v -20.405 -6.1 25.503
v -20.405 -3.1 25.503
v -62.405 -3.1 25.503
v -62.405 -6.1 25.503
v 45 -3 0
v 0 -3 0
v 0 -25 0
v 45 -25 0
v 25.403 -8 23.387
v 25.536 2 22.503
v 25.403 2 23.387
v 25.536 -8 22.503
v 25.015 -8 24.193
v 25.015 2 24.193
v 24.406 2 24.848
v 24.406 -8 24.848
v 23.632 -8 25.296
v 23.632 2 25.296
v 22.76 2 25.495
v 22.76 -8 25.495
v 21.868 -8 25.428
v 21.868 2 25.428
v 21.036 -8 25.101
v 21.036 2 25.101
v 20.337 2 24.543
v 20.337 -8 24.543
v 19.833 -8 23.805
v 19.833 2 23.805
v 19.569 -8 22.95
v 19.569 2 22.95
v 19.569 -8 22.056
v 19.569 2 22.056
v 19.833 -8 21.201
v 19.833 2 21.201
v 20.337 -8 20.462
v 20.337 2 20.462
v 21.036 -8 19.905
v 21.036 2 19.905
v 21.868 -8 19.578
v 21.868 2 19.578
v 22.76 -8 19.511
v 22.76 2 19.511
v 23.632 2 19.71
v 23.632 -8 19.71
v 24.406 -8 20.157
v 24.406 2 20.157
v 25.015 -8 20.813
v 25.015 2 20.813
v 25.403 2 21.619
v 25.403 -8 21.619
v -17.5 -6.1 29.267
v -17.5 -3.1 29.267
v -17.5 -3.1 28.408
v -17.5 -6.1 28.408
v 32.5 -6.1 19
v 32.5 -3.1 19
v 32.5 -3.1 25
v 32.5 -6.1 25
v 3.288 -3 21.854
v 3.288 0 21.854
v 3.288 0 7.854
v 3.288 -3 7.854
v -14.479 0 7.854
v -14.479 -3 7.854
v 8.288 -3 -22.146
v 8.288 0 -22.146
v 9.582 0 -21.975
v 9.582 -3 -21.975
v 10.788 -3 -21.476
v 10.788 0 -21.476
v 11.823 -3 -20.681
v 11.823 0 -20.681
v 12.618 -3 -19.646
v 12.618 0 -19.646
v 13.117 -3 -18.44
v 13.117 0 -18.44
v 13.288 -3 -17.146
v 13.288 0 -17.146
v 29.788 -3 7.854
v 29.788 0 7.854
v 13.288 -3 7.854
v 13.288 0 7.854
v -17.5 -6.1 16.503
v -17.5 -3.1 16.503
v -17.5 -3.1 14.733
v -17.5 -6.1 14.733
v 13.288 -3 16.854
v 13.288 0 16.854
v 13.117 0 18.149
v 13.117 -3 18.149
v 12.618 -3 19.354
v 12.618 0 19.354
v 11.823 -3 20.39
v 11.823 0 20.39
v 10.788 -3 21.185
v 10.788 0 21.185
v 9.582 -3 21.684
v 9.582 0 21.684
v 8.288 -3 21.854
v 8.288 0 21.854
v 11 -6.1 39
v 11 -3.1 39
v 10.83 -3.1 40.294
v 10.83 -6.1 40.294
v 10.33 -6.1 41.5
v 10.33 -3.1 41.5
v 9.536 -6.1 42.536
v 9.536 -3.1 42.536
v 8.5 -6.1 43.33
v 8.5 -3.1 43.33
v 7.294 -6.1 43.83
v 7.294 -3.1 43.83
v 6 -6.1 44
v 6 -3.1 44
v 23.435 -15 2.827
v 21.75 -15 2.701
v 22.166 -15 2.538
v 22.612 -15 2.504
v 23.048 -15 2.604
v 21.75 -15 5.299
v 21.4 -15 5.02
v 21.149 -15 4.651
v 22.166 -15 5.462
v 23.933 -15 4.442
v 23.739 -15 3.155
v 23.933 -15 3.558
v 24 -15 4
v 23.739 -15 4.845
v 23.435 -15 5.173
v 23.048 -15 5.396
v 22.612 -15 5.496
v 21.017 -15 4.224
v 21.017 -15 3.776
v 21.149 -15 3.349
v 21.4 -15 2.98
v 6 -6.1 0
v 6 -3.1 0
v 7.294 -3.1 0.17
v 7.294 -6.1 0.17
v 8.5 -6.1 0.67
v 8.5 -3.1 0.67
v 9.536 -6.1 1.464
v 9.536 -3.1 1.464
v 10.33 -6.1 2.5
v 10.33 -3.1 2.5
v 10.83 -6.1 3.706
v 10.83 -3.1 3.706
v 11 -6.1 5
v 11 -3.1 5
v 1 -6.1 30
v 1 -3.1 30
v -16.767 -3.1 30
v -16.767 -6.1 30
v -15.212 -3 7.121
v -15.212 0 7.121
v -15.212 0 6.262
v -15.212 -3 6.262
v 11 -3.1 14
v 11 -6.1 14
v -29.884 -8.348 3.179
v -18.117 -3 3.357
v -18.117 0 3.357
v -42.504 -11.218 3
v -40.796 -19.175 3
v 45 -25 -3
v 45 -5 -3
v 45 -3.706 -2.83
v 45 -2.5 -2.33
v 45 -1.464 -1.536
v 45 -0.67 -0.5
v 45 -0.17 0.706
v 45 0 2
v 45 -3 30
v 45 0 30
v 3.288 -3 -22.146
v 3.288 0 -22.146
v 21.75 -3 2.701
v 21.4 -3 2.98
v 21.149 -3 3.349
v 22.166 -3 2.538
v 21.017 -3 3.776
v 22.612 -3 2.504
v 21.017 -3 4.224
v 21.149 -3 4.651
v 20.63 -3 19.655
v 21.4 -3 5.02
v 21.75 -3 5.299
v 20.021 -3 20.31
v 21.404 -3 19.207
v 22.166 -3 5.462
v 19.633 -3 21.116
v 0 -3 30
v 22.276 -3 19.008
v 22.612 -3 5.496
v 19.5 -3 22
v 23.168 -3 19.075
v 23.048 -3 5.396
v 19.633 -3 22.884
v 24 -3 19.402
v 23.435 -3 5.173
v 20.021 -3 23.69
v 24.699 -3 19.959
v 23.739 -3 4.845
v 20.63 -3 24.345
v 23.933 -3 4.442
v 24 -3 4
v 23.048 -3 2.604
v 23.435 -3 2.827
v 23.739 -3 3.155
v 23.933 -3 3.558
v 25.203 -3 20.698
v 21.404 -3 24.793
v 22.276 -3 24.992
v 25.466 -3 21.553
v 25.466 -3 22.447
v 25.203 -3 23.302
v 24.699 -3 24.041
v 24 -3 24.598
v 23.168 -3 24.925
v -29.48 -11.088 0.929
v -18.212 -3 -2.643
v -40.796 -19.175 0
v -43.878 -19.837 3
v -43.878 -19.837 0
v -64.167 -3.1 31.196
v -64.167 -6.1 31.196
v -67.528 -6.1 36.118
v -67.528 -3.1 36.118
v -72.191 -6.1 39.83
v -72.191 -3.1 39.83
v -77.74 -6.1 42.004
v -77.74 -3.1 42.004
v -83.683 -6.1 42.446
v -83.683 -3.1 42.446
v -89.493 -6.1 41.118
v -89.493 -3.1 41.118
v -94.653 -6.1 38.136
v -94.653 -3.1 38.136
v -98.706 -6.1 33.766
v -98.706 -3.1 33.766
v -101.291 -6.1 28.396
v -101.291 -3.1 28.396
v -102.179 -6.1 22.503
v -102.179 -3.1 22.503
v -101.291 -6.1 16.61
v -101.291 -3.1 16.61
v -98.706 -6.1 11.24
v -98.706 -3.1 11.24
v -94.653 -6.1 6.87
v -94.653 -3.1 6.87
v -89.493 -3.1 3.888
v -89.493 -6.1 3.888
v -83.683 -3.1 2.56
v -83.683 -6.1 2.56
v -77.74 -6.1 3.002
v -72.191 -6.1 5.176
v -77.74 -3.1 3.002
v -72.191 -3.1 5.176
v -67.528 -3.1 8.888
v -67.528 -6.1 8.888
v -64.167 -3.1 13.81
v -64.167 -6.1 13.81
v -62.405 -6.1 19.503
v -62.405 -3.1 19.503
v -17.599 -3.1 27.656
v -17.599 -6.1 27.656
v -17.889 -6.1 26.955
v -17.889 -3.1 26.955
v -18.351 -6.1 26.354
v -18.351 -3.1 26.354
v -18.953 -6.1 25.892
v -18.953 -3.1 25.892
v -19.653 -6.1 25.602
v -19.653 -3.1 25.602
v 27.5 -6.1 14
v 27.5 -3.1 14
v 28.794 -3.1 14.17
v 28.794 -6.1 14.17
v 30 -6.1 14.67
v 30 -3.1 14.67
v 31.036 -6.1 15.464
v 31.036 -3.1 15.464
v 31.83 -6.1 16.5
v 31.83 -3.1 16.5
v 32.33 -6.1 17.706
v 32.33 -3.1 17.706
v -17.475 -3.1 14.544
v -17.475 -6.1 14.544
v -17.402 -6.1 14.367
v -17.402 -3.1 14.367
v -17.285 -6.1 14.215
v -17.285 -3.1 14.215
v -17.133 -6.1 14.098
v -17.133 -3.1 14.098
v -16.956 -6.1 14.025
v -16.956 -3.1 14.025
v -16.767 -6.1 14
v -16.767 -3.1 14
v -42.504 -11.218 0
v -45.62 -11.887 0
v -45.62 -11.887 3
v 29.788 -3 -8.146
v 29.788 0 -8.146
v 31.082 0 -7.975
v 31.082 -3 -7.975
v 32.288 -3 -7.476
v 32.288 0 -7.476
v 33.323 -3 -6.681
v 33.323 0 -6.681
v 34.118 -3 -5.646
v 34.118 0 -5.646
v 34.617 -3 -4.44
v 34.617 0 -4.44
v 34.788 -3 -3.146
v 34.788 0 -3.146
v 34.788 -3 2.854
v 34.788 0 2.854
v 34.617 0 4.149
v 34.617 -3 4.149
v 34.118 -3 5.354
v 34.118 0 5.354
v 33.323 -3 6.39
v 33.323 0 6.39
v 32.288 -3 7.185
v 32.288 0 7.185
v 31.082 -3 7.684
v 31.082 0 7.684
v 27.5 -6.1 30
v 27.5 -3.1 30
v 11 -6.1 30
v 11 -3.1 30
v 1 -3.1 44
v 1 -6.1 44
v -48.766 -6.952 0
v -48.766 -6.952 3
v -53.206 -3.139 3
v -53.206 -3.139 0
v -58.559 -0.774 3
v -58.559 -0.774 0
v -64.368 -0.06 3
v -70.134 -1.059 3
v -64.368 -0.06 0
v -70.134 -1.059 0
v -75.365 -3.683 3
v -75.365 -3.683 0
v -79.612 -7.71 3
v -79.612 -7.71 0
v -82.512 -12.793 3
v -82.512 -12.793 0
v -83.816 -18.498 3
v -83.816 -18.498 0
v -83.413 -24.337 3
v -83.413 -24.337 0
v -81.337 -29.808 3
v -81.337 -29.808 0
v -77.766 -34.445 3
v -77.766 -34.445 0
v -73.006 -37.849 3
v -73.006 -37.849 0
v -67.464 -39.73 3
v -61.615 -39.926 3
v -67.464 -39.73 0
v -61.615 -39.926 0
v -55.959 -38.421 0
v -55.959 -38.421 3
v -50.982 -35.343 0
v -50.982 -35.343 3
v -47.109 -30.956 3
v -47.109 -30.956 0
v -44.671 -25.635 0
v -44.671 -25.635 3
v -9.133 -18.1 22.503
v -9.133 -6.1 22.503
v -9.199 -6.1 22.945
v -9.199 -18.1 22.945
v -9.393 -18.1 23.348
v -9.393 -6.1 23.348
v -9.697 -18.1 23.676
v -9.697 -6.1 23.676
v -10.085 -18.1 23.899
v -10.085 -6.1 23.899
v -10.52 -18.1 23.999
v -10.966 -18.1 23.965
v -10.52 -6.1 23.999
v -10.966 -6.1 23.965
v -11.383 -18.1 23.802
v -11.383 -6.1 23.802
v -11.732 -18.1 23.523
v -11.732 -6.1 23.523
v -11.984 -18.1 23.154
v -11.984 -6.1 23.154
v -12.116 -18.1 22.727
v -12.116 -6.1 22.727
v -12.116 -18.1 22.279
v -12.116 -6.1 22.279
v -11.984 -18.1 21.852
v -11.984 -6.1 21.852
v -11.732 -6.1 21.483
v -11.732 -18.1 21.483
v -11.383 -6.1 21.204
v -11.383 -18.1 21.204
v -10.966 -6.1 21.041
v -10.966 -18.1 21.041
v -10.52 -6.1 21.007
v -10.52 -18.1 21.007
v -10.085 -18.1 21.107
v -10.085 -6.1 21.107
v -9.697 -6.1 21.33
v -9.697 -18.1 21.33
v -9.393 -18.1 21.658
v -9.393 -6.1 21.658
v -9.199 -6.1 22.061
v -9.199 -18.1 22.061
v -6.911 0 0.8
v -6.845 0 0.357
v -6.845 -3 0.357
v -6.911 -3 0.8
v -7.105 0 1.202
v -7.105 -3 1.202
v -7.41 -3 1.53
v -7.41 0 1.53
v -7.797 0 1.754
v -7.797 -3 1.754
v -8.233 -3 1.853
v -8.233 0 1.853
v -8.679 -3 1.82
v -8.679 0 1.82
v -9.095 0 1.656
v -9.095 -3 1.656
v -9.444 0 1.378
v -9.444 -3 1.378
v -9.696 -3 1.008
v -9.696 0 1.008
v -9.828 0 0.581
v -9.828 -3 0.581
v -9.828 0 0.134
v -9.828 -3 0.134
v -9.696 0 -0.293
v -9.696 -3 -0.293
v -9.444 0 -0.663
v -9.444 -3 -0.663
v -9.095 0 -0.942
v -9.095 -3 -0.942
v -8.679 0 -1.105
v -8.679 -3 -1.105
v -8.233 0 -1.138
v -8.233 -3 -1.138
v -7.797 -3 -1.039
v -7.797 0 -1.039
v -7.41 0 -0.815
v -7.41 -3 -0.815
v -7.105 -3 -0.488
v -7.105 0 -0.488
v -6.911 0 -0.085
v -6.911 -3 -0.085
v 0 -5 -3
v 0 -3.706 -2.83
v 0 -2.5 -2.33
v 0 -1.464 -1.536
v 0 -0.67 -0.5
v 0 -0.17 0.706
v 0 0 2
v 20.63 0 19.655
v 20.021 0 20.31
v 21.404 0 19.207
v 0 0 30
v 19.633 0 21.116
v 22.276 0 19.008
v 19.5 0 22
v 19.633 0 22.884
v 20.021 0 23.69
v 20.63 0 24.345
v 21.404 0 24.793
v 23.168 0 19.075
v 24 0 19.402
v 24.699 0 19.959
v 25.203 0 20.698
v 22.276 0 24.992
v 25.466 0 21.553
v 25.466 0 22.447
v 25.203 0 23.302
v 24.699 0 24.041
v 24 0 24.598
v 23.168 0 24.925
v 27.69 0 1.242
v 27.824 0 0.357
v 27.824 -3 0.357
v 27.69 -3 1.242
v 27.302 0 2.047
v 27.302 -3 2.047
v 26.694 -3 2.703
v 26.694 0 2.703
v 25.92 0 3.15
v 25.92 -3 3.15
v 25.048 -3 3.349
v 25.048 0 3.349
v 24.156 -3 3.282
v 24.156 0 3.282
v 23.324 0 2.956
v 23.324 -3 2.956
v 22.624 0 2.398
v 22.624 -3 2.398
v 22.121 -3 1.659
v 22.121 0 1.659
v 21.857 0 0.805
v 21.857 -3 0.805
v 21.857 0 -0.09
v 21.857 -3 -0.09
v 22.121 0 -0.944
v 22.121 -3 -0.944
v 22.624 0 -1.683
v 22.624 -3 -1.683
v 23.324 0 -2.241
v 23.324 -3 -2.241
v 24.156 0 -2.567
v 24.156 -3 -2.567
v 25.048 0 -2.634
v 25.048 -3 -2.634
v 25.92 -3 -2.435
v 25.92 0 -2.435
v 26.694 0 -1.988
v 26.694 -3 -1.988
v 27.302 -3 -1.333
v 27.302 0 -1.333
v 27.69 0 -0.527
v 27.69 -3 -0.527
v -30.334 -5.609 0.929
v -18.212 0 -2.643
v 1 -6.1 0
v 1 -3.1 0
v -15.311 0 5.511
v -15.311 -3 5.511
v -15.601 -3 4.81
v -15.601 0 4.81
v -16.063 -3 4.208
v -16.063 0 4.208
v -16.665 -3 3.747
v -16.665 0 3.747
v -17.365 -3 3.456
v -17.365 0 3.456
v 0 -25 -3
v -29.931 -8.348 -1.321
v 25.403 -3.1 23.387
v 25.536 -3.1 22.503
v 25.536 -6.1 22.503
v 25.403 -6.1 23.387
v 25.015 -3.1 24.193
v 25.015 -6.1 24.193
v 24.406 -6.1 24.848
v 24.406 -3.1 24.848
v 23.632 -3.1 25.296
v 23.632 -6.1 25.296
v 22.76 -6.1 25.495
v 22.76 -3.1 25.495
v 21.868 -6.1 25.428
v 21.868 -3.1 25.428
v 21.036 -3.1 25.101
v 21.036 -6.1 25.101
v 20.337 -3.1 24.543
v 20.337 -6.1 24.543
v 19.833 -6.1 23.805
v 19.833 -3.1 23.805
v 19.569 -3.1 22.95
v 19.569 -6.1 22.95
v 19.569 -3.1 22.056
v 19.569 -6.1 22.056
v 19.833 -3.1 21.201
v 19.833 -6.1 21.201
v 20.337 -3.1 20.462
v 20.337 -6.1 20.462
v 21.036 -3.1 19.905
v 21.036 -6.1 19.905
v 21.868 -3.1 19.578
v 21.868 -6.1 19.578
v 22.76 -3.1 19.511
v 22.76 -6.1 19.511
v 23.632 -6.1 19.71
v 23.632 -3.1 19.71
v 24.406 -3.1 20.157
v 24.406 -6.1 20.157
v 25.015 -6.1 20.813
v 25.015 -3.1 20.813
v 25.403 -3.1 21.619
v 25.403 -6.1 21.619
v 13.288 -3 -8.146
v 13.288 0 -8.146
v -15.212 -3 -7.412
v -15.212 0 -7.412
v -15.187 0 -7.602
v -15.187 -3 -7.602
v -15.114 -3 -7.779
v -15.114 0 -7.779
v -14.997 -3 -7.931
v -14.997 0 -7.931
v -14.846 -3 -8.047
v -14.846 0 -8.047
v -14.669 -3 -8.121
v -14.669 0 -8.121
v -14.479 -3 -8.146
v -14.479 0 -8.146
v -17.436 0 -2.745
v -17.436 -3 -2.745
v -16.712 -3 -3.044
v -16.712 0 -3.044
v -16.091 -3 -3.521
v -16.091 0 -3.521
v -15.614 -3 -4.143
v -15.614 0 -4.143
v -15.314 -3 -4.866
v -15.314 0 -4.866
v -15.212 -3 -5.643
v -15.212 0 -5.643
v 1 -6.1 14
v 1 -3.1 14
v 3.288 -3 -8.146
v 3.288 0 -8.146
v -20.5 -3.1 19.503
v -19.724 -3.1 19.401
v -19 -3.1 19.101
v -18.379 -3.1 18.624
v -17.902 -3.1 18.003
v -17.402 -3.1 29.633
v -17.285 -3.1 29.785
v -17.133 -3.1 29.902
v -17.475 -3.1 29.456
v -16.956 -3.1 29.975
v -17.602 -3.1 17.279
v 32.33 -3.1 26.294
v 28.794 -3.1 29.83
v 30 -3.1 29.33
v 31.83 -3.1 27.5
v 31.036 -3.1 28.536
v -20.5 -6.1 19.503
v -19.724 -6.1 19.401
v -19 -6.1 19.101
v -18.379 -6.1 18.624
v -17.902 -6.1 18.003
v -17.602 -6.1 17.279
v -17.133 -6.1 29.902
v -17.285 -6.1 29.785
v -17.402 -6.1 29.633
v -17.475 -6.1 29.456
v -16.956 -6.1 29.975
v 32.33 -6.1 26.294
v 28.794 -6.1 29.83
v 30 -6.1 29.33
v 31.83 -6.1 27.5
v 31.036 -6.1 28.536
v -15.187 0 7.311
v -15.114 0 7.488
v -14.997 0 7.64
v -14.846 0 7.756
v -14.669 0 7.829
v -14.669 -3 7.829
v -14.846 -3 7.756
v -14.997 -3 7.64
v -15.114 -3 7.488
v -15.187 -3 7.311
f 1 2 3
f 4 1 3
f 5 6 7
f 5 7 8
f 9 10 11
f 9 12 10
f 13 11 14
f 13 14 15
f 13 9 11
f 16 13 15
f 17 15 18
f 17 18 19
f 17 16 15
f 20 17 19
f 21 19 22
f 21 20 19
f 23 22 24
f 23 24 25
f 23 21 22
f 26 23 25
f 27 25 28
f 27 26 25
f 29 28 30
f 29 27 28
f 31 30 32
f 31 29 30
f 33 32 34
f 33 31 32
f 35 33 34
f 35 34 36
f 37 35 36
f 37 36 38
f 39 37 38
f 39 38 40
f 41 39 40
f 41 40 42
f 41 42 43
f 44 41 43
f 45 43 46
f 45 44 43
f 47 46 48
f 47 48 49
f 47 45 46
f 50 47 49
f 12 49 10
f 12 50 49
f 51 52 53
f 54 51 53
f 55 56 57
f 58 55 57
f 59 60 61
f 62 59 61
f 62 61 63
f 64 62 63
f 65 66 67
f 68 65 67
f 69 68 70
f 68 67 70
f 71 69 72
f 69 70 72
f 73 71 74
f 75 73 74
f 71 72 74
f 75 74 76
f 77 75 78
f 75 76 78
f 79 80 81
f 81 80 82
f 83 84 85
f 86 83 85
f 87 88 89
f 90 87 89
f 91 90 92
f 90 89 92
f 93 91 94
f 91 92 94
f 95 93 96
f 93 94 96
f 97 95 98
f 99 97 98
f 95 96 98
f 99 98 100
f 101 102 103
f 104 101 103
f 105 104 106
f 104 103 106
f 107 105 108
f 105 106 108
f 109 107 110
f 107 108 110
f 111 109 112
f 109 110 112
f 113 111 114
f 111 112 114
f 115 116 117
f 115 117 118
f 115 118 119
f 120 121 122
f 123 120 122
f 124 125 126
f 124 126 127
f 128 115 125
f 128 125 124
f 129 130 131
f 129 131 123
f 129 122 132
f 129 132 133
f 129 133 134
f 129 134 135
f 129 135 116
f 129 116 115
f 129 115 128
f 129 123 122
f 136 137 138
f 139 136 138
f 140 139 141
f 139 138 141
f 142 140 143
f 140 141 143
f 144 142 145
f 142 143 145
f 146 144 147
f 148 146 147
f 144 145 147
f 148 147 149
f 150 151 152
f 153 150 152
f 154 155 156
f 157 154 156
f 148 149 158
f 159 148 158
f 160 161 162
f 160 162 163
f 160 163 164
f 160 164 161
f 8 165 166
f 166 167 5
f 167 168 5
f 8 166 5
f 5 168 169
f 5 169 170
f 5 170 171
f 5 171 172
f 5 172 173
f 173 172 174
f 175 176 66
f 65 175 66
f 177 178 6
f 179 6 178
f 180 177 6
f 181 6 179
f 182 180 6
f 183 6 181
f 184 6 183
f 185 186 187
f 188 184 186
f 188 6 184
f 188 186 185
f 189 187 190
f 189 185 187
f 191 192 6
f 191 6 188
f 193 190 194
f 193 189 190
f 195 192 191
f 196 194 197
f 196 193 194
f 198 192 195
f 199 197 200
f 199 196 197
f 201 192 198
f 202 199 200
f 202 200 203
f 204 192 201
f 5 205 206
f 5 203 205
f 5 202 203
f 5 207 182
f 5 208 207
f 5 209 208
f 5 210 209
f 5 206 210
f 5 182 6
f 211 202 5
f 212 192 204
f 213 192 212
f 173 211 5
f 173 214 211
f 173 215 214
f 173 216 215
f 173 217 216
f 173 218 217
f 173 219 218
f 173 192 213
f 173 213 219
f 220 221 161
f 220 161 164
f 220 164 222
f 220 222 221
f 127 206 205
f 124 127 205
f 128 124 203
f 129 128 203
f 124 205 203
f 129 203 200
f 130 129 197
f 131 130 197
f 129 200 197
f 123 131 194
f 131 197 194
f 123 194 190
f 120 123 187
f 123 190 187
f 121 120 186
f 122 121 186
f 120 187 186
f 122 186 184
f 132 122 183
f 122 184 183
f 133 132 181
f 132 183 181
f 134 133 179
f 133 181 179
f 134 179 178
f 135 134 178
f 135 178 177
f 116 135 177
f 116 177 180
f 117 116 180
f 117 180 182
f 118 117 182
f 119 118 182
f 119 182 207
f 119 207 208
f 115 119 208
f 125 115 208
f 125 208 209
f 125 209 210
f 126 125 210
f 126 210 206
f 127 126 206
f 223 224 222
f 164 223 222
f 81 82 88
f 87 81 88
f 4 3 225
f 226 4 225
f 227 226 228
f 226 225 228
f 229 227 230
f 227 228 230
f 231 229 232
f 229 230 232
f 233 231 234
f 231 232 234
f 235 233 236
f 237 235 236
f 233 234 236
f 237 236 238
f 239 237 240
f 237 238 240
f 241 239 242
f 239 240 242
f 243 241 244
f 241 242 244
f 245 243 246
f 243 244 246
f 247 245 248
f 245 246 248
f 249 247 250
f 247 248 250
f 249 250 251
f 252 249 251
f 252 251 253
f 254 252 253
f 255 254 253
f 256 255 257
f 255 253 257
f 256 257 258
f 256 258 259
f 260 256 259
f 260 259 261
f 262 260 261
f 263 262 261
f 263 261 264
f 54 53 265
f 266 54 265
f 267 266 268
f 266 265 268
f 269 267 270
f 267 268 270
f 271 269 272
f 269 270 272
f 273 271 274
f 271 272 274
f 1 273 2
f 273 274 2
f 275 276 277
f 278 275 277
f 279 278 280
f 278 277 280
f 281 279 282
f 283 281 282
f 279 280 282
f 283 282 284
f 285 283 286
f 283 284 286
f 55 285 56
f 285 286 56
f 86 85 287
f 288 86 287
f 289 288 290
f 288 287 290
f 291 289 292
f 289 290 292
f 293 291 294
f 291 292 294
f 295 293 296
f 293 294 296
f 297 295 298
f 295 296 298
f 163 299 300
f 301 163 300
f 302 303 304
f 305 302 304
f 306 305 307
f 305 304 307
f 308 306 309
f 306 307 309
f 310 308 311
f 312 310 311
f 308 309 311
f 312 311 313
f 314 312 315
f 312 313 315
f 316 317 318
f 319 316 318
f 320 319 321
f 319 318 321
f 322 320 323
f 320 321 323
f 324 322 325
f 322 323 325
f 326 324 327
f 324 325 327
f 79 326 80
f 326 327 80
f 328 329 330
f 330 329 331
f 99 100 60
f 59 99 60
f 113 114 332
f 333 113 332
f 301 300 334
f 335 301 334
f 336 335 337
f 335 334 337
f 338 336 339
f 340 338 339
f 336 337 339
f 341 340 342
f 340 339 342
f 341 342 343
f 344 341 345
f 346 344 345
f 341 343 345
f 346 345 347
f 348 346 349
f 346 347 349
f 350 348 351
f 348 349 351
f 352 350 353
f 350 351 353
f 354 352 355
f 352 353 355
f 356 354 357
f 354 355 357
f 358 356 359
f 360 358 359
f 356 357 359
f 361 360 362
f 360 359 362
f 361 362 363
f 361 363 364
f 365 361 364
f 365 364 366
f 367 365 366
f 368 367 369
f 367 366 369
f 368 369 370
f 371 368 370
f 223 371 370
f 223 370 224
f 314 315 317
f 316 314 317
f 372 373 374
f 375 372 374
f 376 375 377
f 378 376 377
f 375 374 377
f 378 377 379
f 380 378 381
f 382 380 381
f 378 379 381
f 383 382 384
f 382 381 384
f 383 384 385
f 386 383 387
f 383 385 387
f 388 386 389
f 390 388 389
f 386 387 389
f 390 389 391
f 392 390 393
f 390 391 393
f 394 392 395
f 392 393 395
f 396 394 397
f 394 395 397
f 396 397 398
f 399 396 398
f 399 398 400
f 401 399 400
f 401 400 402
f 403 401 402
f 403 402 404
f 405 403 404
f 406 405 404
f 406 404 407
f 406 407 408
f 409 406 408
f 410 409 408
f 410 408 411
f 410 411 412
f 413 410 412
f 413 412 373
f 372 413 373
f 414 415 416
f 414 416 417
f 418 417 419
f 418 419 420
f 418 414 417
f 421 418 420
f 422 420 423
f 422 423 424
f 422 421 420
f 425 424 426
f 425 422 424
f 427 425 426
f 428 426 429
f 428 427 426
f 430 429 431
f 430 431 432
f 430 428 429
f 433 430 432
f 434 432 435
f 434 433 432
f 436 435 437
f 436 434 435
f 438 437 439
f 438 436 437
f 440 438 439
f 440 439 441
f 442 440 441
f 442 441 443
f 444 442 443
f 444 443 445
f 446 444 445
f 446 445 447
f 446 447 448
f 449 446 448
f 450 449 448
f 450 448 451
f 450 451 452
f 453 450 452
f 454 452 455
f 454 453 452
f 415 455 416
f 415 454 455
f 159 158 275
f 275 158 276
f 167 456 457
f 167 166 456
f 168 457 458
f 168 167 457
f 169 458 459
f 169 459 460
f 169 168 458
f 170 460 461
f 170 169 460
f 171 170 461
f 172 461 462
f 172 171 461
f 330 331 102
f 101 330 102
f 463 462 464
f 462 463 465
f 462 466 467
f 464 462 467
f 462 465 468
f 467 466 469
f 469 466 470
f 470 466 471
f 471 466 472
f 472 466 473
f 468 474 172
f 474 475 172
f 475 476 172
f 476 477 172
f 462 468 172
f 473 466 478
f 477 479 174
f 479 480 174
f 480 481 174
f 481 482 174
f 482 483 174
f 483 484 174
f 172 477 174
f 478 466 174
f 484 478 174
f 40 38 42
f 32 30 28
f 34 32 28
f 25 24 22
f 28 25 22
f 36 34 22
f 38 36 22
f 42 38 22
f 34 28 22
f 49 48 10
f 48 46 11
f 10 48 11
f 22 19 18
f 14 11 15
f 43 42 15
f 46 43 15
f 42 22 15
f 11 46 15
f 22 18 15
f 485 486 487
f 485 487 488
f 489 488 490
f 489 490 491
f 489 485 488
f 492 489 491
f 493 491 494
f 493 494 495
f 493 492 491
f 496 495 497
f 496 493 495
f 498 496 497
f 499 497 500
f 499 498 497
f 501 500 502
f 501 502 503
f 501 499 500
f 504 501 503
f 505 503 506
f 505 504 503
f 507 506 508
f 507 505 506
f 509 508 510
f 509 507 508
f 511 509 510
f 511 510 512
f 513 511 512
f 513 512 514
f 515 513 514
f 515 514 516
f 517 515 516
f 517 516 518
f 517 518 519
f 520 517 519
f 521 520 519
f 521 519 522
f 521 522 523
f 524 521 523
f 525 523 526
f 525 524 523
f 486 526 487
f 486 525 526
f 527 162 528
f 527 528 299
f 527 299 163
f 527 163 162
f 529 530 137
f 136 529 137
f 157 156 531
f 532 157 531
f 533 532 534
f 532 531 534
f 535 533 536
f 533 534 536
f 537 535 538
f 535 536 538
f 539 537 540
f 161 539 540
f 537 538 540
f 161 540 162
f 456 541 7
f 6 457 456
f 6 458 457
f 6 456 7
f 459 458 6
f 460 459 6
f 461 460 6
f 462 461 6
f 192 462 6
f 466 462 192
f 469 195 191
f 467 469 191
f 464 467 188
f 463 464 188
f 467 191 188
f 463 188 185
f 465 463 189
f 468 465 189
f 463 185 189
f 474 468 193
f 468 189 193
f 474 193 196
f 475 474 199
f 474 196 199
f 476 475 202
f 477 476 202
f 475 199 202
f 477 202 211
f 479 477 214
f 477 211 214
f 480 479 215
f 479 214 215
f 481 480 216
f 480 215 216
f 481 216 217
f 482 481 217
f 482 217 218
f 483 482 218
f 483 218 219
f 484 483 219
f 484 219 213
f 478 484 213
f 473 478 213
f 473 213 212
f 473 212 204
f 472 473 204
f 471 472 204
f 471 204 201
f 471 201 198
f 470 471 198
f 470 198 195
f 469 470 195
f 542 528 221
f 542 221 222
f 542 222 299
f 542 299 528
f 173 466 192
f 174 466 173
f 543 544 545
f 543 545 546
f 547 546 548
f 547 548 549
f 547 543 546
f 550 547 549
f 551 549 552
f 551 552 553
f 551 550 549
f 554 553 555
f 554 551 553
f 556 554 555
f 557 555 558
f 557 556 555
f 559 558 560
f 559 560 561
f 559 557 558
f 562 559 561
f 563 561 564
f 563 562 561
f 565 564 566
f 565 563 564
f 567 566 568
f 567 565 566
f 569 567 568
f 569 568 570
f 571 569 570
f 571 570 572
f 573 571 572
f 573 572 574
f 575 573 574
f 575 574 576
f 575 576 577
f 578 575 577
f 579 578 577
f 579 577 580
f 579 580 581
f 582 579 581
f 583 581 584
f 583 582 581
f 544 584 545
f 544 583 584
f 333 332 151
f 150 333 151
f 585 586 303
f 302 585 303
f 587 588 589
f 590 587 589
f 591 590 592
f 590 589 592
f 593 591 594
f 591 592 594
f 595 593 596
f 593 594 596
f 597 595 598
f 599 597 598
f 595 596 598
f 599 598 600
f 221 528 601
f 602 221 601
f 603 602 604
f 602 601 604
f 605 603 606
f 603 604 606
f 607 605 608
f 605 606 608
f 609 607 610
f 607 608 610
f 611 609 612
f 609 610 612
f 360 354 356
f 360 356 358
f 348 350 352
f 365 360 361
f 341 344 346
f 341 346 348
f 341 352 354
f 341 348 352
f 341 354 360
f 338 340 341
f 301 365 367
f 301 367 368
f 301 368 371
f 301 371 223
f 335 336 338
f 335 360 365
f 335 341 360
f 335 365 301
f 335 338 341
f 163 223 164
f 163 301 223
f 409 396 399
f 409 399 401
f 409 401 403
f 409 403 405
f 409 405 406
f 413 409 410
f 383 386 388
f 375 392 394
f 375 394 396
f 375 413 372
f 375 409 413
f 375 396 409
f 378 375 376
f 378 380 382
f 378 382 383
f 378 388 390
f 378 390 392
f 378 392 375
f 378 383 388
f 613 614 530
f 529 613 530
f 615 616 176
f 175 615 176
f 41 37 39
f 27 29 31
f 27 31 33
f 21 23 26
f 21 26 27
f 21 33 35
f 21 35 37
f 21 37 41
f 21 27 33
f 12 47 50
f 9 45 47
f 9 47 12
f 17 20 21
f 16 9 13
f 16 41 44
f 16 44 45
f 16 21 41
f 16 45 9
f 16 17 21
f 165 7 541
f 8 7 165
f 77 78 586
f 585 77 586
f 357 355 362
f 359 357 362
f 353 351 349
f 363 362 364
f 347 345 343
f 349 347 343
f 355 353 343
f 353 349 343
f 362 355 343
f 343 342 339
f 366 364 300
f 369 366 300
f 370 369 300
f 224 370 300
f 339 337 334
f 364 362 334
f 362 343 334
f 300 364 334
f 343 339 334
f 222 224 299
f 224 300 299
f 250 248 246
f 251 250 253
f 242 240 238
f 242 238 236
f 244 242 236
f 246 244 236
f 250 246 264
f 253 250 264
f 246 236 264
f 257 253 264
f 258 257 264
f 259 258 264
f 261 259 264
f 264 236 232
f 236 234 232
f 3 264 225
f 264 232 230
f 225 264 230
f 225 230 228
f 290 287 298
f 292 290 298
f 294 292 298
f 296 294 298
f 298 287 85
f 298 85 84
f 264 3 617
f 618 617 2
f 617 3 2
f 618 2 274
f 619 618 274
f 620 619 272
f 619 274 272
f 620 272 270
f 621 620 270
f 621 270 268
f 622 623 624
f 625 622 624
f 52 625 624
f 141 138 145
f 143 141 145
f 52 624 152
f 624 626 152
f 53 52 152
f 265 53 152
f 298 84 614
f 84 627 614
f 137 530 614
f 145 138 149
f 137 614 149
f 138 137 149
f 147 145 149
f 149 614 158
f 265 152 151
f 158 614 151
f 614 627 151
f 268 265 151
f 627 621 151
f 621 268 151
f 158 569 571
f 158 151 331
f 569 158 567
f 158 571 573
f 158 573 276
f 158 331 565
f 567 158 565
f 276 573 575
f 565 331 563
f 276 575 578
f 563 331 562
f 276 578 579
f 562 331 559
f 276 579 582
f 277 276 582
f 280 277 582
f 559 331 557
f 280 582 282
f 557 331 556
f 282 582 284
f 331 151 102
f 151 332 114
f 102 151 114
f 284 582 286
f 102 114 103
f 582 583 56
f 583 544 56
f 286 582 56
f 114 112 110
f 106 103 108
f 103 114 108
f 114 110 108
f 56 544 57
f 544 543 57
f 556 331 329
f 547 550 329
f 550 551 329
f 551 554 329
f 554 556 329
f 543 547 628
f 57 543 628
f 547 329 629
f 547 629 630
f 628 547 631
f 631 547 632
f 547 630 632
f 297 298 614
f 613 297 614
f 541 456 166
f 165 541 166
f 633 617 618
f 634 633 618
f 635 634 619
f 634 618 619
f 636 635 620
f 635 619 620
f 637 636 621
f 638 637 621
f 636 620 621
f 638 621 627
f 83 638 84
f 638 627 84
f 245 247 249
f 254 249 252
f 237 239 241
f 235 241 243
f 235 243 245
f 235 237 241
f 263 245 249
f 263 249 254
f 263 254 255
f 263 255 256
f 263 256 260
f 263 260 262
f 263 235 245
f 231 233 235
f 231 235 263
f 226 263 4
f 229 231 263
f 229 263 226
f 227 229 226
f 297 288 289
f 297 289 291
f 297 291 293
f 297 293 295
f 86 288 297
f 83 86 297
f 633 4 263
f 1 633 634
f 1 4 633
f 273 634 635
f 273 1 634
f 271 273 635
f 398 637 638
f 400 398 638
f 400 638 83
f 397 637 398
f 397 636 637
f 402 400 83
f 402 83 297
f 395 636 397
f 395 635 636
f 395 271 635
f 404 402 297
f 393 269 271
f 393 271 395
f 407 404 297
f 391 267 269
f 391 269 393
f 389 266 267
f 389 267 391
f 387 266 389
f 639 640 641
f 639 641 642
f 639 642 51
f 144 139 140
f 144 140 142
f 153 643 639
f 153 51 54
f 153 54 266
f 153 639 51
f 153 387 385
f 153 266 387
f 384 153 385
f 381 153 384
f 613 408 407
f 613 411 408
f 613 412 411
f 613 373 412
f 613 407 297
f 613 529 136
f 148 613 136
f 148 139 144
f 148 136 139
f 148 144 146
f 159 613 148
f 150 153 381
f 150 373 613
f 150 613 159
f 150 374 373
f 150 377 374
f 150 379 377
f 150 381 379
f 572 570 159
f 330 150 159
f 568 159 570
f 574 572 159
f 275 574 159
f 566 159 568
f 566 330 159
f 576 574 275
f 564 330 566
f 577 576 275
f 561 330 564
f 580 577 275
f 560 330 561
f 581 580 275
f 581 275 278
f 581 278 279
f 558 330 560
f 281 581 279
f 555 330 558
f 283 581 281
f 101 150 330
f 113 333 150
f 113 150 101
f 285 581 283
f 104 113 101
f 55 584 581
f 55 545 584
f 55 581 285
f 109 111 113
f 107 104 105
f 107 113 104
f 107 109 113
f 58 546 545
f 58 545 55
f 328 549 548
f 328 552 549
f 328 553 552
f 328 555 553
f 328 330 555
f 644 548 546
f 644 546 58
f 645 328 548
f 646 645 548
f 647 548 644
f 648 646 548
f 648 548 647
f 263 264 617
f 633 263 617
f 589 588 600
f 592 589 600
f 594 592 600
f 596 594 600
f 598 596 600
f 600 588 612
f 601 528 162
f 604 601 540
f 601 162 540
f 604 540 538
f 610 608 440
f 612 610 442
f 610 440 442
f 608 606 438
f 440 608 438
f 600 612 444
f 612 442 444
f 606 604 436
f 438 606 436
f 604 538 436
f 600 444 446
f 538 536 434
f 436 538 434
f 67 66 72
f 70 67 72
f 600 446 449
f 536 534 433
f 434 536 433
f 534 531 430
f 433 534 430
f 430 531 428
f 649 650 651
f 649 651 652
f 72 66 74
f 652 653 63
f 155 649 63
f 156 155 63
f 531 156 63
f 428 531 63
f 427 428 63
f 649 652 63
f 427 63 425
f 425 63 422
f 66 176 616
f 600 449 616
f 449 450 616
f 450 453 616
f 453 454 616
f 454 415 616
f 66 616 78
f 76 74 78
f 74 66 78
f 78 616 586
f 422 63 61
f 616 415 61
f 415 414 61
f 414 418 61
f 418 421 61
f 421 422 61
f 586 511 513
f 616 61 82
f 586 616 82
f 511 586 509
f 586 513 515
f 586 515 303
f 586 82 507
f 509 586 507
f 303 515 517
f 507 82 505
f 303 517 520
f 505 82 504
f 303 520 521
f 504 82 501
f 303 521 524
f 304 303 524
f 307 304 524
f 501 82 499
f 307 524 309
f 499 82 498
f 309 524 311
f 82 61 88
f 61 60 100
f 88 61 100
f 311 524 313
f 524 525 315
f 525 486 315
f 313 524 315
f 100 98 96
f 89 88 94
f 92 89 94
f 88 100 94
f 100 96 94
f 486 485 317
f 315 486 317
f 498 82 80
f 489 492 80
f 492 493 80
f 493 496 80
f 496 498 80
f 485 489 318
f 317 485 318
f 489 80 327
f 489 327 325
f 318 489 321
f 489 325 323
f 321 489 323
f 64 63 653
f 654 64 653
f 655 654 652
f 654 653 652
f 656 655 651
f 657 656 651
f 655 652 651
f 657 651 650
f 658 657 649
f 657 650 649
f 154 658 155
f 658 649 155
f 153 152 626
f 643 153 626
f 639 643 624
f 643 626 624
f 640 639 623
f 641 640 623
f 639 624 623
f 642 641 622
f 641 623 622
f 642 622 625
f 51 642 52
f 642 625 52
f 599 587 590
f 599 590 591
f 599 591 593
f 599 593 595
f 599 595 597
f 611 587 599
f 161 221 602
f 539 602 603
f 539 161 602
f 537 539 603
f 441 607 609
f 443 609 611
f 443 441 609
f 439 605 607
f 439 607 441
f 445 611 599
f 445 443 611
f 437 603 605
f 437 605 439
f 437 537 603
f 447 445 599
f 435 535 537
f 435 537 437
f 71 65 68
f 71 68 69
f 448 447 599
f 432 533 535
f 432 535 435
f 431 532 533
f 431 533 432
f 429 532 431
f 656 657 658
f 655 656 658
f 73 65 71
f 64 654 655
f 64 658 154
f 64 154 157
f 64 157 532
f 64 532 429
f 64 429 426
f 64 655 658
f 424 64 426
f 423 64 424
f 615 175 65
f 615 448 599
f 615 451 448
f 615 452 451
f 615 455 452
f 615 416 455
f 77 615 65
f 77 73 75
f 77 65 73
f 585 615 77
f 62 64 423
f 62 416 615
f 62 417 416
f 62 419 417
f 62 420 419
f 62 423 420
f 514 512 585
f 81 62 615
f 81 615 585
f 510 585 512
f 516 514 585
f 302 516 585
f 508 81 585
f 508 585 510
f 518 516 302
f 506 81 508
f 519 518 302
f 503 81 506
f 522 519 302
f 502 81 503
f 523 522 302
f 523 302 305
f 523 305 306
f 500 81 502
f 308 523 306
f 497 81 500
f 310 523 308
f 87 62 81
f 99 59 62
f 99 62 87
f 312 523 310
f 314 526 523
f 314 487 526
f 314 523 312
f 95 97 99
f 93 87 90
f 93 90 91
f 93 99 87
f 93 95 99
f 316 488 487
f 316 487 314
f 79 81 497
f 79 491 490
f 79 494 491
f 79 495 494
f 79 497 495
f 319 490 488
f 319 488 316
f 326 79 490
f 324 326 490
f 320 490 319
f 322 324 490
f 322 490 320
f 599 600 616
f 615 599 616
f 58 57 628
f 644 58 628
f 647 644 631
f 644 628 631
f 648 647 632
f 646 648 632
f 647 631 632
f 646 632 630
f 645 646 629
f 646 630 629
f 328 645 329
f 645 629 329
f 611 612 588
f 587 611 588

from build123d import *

# Parameters (mm, degrees)
F0_W          = 45
F0_H          = 30
F0_R          = 1.5
F1_DEPTH      = 3
F0_H_2        = 3
F2_DEPTH      = 25
F3_D          = 6
F4_R          = 5
F5_R          = 1.5
F5_R_2        = 3
F6_DEPTH      = 3
F7_DEPTH      = 8
F7_DEPTH_BACK = 2
F8_DEPTH      = 15
F10_DEPTH     = 15
F13_DEPTH     = 3
F12_R         = 1.5
F12_R_2       = 3
F14_DEPTH     = 3
F14_FACE_W    = 3
F14_FACE_H    = 6.0007511677
F13_FACE_W    = 8.1384943845
F13_FACE_H    = 3


with BuildPart() as f1:
    # F0 (on Front) → F1 (new body)
    with BuildSketch(Plane.XZ):
        with Locations((22.5, 15)):
            Rectangle(F0_W, F0_H)
        with Locations((22.5, 4)):
            Circle(F0_R, mode=Mode.SUBTRACT)
    extrude(amount=F1_DEPTH)

    # F0 (on Front) → F2 (join)
    with BuildSketch(Plane.XZ):
        with Locations((22.5, -1.5)):
            Rectangle(F0_W, F0_H_2)
    extrude(amount=F2_DEPTH)

    # F3 (through all)
    with Locations(Plane(origin=(0, 0, 0), x_dir=(1, 0, 0), z_dir=(0, 1, 0))):
        with Locations((22.5, -22)):
            Hole(F3_D / 2)

    # F4
    f4_edges = [f1.edges().sort_by_distance(p)[0] for p in [
        (22.5, 0, -3),
    ]]
    fillet(f4_edges, radius=F4_R)

    # F0 (on Front) → F10 (join)
    with BuildSketch(Plane.XZ):
        with Locations((22.5, 4)):
            Circle(F0_R)
    extrude(amount=F10_DEPTH)


with BuildPart() as f6:
    # F5 (on Front) → F6 (new body)
    with BuildSketch(Plane.XZ):
        with BuildLine():
            ThreePointArc((32.5, 25), (31.0355339059, 28.5355339059), (27.5, 30))
            Line((27.5, 30), (11, 30))
            Line((11, 30), (11, 39))
            ThreePointArc((11, 39), (9.5355339059, 42.5355339059), (6, 44))
            Line((6, 44), (1, 44))
            Line((1, 44), (1, 30))
            Line((1, 30), (-16.7666415907, 30))
            ThreePointArc((-16.7666415907, 30), (-17.285204295, 29.785204295), (-17.5, 29.2666415907))
            Line((-17.5, 29.2666415907), (-17.5, 28.4080051974))
            ThreePointArc((-17.5, 28.4080051974), (-18.3508708734, 26.353821195), (-20.4050548757, 25.5029503216))
            Line((-20.4050548757, 25.5029503216), (-62.4050548757, 25.5029503216))
            ThreePointArc((-62.4050548757, 25.5029503216), (-102.178774809, 22.5029503216), (-62.4050548757, 19.5029503216))
            Line((-62.4050548757, 19.5029503216), (-20.5, 19.5029503216))
            ThreePointArc((-20.5, 19.5029503216), (-18.3786796564, 18.6242706652), (-17.5, 16.5029503216))
            Line((-17.5, 16.5029503216), (-17.5, 14.7333584093))
            ThreePointArc((-17.5, 14.7333584093), (-17.285204295, 14.214795705), (-16.7666415907, 14))
            Line((-16.7666415907, 14), (1, 14))
            Line((1, 14), (1, 0))
            Line((1, 0), (6, 0))
            ThreePointArc((6, 0), (9.5355339059, 1.4644660941), (11, 5))
            Line((11, 5), (11, 14))
            Line((11, 14), (27.5, 14))
            ThreePointArc((27.5, 14), (31.0355339059, 15.4644660941), (32.5, 19))
            Line((32.5, 19), (32.5, 25))
        make_face()
        with Locations((-10.6325279921, 22.5029503216)):
            Circle(F5_R, mode=Mode.SUBTRACT)
        with Locations((22.5359164178, 22.5029503216)):
            Circle(F5_R_2, mode=Mode.SUBTRACT)
    extrude(amount=F6_DEPTH)

    # F5 (on Front) → F8 (join)
    with BuildSketch(Plane.XZ):
        with Locations((-10.6325279921, 22.5029503216)):
            Circle(F5_R)
    extrude(amount=F8_DEPTH)


with BuildPart() as f7:
    # F5 (on Front) → F7 (new body, two sides)
    with BuildSketch(Plane.XZ) as f7_sk:
        with Locations((22.5359164178, 22.5029503216)):
            Circle(F5_R_2)
    extrude(amount=F7_DEPTH)
    extrude(f7_sk.sketch, amount=-F7_DEPTH_BACK)


with BuildPart() as f6_1:
    # F9: moved
    add(f6.part.moved(Location((0, -3.1, 0))))


with BuildPart() as f13:
    # F11 (on Top) → F13 (new body)
    with BuildSketch(Plane.XY):
        with BuildLine():
            Line((-42.503958739, -11.217947247), (-45.620290691, -11.8869222764))
            ThreePointArc((-45.620290691, -11.8869222764), (-83.4127590866, -24.3366303772), (-43.8777487707, -19.8367572071))
            Line((-43.8777487707, -19.8367572071), (-40.7958033527, -19.1751638472))
            Line((-40.7958033527, -19.1751638472), (-42.503958739, -11.217947247))
        make_face()
    extrude(amount=F13_DEPTH)



with BuildPart() as f14:
    # F12 (on Front) → F14 (new body)
    with BuildSketch(Plane.XZ):
        with BuildLine():
            ThreePointArc((34.7877358819, 2.8544844273), (33.3232697878, 6.3900183332), (29.7877358819, 7.8544844273))
            Line((29.7877358819, 7.8544844273), (13.2877358819, 7.8544844273))
            Line((13.2877358819, 7.8544844273), (13.2877358819, 16.8544844273))
            ThreePointArc((13.2877358819, 16.8544844273), (11.8232697878, 20.3900183332), (8.2877358819, 21.8544844273))
            Line((8.2877358819, 21.8544844273), (3.2877358819, 21.8544844273))
            Line((3.2877358819, 21.8544844273), (3.2877358819, 7.8544844273))
            Line((3.2877358819, 7.8544844273), (-14.4789057088, 7.8544844273))
            ThreePointArc((-14.4789057088, 7.8544844273), (-14.9974684131, 7.6396887222), (-15.2122641181, 7.121126018))
            Line((-15.2122641181, 7.121126018), (-15.2122641181, 6.2624896246))
            ThreePointArc((-15.2122641181, 6.2624896246), (-16.0631349915, 4.2083056223), (-18.1173189938, 3.3574347489))
            Line((-18.1173189938, 3.3574347489), (-18.2122641181, -2.6425652511))
            ThreePointArc((-18.2122641181, -2.6425652511), (-16.0909437745, -3.5212449075), (-15.2122641181, -5.6425652511))
            Line((-15.2122641181, -5.6425652511), (-15.2122641181, -7.4121571635))
            ThreePointArc((-15.2122641181, -7.4121571635), (-14.9974684131, -7.9307198677), (-14.4789057088, -8.1455155727))
            Line((-14.4789057088, -8.1455155727), (3.2877358819, -8.1455155727))
            Line((3.2877358819, -8.1455155727), (3.2877358819, -22.1455155727))
            Line((3.2877358819, -22.1455155727), (8.2877358819, -22.1455155727))
            ThreePointArc((8.2877358819, -22.1455155727), (11.8232697878, -20.6810494787), (13.2877358819, -17.1455155727))
            Line((13.2877358819, -17.1455155727), (13.2877358819, -8.1455155727))
            Line((13.2877358819, -8.1455155727), (29.7877358819, -8.1455155727))
            ThreePointArc((29.7877358819, -8.1455155727), (33.3232697878, -6.6810494787), (34.7877358819, -3.1455155727))
            Line((34.7877358819, -3.1455155727), (34.7877358819, 2.8544844273))
        make_face()
        with Locations((-8.3447921102, 0.3574347489)):
            Circle(F12_R, mode=Mode.SUBTRACT)
        with Locations((24.8236522997, 0.3574347489)):
            Circle(F12_R_2, mode=Mode.SUBTRACT)
    extrude(amount=F14_DEPTH)


with BuildPart() as f13_1:
    add(f13.part)

    add(f14.part)  # F15 merges F14
    # F14_face (on face) → F15 section 0
    with BuildSketch(Plane(origin=(-18.1647915559, -1.5, 0.3574347489), x_dir=(0, -1, 0), z_dir=(-0.9998748211, 0, 0.0158222065))):
        Rectangle(F14_FACE_W, F14_FACE_H)
    # F13_face (on face) → F15 section 1
    with BuildSketch(Plane(origin=(-41.6498810458, -15.1965555471, 1.5), x_dir=(-0.2098859206, 0.977725882, 0), z_dir=(0.977725882, 0.2098859206, 0))):
        Rectangle(F13_FACE_W, F13_FACE_H)
    loft()


solid = Compound([f1.part, f7.part, f6_1.part, f13_1.part])
